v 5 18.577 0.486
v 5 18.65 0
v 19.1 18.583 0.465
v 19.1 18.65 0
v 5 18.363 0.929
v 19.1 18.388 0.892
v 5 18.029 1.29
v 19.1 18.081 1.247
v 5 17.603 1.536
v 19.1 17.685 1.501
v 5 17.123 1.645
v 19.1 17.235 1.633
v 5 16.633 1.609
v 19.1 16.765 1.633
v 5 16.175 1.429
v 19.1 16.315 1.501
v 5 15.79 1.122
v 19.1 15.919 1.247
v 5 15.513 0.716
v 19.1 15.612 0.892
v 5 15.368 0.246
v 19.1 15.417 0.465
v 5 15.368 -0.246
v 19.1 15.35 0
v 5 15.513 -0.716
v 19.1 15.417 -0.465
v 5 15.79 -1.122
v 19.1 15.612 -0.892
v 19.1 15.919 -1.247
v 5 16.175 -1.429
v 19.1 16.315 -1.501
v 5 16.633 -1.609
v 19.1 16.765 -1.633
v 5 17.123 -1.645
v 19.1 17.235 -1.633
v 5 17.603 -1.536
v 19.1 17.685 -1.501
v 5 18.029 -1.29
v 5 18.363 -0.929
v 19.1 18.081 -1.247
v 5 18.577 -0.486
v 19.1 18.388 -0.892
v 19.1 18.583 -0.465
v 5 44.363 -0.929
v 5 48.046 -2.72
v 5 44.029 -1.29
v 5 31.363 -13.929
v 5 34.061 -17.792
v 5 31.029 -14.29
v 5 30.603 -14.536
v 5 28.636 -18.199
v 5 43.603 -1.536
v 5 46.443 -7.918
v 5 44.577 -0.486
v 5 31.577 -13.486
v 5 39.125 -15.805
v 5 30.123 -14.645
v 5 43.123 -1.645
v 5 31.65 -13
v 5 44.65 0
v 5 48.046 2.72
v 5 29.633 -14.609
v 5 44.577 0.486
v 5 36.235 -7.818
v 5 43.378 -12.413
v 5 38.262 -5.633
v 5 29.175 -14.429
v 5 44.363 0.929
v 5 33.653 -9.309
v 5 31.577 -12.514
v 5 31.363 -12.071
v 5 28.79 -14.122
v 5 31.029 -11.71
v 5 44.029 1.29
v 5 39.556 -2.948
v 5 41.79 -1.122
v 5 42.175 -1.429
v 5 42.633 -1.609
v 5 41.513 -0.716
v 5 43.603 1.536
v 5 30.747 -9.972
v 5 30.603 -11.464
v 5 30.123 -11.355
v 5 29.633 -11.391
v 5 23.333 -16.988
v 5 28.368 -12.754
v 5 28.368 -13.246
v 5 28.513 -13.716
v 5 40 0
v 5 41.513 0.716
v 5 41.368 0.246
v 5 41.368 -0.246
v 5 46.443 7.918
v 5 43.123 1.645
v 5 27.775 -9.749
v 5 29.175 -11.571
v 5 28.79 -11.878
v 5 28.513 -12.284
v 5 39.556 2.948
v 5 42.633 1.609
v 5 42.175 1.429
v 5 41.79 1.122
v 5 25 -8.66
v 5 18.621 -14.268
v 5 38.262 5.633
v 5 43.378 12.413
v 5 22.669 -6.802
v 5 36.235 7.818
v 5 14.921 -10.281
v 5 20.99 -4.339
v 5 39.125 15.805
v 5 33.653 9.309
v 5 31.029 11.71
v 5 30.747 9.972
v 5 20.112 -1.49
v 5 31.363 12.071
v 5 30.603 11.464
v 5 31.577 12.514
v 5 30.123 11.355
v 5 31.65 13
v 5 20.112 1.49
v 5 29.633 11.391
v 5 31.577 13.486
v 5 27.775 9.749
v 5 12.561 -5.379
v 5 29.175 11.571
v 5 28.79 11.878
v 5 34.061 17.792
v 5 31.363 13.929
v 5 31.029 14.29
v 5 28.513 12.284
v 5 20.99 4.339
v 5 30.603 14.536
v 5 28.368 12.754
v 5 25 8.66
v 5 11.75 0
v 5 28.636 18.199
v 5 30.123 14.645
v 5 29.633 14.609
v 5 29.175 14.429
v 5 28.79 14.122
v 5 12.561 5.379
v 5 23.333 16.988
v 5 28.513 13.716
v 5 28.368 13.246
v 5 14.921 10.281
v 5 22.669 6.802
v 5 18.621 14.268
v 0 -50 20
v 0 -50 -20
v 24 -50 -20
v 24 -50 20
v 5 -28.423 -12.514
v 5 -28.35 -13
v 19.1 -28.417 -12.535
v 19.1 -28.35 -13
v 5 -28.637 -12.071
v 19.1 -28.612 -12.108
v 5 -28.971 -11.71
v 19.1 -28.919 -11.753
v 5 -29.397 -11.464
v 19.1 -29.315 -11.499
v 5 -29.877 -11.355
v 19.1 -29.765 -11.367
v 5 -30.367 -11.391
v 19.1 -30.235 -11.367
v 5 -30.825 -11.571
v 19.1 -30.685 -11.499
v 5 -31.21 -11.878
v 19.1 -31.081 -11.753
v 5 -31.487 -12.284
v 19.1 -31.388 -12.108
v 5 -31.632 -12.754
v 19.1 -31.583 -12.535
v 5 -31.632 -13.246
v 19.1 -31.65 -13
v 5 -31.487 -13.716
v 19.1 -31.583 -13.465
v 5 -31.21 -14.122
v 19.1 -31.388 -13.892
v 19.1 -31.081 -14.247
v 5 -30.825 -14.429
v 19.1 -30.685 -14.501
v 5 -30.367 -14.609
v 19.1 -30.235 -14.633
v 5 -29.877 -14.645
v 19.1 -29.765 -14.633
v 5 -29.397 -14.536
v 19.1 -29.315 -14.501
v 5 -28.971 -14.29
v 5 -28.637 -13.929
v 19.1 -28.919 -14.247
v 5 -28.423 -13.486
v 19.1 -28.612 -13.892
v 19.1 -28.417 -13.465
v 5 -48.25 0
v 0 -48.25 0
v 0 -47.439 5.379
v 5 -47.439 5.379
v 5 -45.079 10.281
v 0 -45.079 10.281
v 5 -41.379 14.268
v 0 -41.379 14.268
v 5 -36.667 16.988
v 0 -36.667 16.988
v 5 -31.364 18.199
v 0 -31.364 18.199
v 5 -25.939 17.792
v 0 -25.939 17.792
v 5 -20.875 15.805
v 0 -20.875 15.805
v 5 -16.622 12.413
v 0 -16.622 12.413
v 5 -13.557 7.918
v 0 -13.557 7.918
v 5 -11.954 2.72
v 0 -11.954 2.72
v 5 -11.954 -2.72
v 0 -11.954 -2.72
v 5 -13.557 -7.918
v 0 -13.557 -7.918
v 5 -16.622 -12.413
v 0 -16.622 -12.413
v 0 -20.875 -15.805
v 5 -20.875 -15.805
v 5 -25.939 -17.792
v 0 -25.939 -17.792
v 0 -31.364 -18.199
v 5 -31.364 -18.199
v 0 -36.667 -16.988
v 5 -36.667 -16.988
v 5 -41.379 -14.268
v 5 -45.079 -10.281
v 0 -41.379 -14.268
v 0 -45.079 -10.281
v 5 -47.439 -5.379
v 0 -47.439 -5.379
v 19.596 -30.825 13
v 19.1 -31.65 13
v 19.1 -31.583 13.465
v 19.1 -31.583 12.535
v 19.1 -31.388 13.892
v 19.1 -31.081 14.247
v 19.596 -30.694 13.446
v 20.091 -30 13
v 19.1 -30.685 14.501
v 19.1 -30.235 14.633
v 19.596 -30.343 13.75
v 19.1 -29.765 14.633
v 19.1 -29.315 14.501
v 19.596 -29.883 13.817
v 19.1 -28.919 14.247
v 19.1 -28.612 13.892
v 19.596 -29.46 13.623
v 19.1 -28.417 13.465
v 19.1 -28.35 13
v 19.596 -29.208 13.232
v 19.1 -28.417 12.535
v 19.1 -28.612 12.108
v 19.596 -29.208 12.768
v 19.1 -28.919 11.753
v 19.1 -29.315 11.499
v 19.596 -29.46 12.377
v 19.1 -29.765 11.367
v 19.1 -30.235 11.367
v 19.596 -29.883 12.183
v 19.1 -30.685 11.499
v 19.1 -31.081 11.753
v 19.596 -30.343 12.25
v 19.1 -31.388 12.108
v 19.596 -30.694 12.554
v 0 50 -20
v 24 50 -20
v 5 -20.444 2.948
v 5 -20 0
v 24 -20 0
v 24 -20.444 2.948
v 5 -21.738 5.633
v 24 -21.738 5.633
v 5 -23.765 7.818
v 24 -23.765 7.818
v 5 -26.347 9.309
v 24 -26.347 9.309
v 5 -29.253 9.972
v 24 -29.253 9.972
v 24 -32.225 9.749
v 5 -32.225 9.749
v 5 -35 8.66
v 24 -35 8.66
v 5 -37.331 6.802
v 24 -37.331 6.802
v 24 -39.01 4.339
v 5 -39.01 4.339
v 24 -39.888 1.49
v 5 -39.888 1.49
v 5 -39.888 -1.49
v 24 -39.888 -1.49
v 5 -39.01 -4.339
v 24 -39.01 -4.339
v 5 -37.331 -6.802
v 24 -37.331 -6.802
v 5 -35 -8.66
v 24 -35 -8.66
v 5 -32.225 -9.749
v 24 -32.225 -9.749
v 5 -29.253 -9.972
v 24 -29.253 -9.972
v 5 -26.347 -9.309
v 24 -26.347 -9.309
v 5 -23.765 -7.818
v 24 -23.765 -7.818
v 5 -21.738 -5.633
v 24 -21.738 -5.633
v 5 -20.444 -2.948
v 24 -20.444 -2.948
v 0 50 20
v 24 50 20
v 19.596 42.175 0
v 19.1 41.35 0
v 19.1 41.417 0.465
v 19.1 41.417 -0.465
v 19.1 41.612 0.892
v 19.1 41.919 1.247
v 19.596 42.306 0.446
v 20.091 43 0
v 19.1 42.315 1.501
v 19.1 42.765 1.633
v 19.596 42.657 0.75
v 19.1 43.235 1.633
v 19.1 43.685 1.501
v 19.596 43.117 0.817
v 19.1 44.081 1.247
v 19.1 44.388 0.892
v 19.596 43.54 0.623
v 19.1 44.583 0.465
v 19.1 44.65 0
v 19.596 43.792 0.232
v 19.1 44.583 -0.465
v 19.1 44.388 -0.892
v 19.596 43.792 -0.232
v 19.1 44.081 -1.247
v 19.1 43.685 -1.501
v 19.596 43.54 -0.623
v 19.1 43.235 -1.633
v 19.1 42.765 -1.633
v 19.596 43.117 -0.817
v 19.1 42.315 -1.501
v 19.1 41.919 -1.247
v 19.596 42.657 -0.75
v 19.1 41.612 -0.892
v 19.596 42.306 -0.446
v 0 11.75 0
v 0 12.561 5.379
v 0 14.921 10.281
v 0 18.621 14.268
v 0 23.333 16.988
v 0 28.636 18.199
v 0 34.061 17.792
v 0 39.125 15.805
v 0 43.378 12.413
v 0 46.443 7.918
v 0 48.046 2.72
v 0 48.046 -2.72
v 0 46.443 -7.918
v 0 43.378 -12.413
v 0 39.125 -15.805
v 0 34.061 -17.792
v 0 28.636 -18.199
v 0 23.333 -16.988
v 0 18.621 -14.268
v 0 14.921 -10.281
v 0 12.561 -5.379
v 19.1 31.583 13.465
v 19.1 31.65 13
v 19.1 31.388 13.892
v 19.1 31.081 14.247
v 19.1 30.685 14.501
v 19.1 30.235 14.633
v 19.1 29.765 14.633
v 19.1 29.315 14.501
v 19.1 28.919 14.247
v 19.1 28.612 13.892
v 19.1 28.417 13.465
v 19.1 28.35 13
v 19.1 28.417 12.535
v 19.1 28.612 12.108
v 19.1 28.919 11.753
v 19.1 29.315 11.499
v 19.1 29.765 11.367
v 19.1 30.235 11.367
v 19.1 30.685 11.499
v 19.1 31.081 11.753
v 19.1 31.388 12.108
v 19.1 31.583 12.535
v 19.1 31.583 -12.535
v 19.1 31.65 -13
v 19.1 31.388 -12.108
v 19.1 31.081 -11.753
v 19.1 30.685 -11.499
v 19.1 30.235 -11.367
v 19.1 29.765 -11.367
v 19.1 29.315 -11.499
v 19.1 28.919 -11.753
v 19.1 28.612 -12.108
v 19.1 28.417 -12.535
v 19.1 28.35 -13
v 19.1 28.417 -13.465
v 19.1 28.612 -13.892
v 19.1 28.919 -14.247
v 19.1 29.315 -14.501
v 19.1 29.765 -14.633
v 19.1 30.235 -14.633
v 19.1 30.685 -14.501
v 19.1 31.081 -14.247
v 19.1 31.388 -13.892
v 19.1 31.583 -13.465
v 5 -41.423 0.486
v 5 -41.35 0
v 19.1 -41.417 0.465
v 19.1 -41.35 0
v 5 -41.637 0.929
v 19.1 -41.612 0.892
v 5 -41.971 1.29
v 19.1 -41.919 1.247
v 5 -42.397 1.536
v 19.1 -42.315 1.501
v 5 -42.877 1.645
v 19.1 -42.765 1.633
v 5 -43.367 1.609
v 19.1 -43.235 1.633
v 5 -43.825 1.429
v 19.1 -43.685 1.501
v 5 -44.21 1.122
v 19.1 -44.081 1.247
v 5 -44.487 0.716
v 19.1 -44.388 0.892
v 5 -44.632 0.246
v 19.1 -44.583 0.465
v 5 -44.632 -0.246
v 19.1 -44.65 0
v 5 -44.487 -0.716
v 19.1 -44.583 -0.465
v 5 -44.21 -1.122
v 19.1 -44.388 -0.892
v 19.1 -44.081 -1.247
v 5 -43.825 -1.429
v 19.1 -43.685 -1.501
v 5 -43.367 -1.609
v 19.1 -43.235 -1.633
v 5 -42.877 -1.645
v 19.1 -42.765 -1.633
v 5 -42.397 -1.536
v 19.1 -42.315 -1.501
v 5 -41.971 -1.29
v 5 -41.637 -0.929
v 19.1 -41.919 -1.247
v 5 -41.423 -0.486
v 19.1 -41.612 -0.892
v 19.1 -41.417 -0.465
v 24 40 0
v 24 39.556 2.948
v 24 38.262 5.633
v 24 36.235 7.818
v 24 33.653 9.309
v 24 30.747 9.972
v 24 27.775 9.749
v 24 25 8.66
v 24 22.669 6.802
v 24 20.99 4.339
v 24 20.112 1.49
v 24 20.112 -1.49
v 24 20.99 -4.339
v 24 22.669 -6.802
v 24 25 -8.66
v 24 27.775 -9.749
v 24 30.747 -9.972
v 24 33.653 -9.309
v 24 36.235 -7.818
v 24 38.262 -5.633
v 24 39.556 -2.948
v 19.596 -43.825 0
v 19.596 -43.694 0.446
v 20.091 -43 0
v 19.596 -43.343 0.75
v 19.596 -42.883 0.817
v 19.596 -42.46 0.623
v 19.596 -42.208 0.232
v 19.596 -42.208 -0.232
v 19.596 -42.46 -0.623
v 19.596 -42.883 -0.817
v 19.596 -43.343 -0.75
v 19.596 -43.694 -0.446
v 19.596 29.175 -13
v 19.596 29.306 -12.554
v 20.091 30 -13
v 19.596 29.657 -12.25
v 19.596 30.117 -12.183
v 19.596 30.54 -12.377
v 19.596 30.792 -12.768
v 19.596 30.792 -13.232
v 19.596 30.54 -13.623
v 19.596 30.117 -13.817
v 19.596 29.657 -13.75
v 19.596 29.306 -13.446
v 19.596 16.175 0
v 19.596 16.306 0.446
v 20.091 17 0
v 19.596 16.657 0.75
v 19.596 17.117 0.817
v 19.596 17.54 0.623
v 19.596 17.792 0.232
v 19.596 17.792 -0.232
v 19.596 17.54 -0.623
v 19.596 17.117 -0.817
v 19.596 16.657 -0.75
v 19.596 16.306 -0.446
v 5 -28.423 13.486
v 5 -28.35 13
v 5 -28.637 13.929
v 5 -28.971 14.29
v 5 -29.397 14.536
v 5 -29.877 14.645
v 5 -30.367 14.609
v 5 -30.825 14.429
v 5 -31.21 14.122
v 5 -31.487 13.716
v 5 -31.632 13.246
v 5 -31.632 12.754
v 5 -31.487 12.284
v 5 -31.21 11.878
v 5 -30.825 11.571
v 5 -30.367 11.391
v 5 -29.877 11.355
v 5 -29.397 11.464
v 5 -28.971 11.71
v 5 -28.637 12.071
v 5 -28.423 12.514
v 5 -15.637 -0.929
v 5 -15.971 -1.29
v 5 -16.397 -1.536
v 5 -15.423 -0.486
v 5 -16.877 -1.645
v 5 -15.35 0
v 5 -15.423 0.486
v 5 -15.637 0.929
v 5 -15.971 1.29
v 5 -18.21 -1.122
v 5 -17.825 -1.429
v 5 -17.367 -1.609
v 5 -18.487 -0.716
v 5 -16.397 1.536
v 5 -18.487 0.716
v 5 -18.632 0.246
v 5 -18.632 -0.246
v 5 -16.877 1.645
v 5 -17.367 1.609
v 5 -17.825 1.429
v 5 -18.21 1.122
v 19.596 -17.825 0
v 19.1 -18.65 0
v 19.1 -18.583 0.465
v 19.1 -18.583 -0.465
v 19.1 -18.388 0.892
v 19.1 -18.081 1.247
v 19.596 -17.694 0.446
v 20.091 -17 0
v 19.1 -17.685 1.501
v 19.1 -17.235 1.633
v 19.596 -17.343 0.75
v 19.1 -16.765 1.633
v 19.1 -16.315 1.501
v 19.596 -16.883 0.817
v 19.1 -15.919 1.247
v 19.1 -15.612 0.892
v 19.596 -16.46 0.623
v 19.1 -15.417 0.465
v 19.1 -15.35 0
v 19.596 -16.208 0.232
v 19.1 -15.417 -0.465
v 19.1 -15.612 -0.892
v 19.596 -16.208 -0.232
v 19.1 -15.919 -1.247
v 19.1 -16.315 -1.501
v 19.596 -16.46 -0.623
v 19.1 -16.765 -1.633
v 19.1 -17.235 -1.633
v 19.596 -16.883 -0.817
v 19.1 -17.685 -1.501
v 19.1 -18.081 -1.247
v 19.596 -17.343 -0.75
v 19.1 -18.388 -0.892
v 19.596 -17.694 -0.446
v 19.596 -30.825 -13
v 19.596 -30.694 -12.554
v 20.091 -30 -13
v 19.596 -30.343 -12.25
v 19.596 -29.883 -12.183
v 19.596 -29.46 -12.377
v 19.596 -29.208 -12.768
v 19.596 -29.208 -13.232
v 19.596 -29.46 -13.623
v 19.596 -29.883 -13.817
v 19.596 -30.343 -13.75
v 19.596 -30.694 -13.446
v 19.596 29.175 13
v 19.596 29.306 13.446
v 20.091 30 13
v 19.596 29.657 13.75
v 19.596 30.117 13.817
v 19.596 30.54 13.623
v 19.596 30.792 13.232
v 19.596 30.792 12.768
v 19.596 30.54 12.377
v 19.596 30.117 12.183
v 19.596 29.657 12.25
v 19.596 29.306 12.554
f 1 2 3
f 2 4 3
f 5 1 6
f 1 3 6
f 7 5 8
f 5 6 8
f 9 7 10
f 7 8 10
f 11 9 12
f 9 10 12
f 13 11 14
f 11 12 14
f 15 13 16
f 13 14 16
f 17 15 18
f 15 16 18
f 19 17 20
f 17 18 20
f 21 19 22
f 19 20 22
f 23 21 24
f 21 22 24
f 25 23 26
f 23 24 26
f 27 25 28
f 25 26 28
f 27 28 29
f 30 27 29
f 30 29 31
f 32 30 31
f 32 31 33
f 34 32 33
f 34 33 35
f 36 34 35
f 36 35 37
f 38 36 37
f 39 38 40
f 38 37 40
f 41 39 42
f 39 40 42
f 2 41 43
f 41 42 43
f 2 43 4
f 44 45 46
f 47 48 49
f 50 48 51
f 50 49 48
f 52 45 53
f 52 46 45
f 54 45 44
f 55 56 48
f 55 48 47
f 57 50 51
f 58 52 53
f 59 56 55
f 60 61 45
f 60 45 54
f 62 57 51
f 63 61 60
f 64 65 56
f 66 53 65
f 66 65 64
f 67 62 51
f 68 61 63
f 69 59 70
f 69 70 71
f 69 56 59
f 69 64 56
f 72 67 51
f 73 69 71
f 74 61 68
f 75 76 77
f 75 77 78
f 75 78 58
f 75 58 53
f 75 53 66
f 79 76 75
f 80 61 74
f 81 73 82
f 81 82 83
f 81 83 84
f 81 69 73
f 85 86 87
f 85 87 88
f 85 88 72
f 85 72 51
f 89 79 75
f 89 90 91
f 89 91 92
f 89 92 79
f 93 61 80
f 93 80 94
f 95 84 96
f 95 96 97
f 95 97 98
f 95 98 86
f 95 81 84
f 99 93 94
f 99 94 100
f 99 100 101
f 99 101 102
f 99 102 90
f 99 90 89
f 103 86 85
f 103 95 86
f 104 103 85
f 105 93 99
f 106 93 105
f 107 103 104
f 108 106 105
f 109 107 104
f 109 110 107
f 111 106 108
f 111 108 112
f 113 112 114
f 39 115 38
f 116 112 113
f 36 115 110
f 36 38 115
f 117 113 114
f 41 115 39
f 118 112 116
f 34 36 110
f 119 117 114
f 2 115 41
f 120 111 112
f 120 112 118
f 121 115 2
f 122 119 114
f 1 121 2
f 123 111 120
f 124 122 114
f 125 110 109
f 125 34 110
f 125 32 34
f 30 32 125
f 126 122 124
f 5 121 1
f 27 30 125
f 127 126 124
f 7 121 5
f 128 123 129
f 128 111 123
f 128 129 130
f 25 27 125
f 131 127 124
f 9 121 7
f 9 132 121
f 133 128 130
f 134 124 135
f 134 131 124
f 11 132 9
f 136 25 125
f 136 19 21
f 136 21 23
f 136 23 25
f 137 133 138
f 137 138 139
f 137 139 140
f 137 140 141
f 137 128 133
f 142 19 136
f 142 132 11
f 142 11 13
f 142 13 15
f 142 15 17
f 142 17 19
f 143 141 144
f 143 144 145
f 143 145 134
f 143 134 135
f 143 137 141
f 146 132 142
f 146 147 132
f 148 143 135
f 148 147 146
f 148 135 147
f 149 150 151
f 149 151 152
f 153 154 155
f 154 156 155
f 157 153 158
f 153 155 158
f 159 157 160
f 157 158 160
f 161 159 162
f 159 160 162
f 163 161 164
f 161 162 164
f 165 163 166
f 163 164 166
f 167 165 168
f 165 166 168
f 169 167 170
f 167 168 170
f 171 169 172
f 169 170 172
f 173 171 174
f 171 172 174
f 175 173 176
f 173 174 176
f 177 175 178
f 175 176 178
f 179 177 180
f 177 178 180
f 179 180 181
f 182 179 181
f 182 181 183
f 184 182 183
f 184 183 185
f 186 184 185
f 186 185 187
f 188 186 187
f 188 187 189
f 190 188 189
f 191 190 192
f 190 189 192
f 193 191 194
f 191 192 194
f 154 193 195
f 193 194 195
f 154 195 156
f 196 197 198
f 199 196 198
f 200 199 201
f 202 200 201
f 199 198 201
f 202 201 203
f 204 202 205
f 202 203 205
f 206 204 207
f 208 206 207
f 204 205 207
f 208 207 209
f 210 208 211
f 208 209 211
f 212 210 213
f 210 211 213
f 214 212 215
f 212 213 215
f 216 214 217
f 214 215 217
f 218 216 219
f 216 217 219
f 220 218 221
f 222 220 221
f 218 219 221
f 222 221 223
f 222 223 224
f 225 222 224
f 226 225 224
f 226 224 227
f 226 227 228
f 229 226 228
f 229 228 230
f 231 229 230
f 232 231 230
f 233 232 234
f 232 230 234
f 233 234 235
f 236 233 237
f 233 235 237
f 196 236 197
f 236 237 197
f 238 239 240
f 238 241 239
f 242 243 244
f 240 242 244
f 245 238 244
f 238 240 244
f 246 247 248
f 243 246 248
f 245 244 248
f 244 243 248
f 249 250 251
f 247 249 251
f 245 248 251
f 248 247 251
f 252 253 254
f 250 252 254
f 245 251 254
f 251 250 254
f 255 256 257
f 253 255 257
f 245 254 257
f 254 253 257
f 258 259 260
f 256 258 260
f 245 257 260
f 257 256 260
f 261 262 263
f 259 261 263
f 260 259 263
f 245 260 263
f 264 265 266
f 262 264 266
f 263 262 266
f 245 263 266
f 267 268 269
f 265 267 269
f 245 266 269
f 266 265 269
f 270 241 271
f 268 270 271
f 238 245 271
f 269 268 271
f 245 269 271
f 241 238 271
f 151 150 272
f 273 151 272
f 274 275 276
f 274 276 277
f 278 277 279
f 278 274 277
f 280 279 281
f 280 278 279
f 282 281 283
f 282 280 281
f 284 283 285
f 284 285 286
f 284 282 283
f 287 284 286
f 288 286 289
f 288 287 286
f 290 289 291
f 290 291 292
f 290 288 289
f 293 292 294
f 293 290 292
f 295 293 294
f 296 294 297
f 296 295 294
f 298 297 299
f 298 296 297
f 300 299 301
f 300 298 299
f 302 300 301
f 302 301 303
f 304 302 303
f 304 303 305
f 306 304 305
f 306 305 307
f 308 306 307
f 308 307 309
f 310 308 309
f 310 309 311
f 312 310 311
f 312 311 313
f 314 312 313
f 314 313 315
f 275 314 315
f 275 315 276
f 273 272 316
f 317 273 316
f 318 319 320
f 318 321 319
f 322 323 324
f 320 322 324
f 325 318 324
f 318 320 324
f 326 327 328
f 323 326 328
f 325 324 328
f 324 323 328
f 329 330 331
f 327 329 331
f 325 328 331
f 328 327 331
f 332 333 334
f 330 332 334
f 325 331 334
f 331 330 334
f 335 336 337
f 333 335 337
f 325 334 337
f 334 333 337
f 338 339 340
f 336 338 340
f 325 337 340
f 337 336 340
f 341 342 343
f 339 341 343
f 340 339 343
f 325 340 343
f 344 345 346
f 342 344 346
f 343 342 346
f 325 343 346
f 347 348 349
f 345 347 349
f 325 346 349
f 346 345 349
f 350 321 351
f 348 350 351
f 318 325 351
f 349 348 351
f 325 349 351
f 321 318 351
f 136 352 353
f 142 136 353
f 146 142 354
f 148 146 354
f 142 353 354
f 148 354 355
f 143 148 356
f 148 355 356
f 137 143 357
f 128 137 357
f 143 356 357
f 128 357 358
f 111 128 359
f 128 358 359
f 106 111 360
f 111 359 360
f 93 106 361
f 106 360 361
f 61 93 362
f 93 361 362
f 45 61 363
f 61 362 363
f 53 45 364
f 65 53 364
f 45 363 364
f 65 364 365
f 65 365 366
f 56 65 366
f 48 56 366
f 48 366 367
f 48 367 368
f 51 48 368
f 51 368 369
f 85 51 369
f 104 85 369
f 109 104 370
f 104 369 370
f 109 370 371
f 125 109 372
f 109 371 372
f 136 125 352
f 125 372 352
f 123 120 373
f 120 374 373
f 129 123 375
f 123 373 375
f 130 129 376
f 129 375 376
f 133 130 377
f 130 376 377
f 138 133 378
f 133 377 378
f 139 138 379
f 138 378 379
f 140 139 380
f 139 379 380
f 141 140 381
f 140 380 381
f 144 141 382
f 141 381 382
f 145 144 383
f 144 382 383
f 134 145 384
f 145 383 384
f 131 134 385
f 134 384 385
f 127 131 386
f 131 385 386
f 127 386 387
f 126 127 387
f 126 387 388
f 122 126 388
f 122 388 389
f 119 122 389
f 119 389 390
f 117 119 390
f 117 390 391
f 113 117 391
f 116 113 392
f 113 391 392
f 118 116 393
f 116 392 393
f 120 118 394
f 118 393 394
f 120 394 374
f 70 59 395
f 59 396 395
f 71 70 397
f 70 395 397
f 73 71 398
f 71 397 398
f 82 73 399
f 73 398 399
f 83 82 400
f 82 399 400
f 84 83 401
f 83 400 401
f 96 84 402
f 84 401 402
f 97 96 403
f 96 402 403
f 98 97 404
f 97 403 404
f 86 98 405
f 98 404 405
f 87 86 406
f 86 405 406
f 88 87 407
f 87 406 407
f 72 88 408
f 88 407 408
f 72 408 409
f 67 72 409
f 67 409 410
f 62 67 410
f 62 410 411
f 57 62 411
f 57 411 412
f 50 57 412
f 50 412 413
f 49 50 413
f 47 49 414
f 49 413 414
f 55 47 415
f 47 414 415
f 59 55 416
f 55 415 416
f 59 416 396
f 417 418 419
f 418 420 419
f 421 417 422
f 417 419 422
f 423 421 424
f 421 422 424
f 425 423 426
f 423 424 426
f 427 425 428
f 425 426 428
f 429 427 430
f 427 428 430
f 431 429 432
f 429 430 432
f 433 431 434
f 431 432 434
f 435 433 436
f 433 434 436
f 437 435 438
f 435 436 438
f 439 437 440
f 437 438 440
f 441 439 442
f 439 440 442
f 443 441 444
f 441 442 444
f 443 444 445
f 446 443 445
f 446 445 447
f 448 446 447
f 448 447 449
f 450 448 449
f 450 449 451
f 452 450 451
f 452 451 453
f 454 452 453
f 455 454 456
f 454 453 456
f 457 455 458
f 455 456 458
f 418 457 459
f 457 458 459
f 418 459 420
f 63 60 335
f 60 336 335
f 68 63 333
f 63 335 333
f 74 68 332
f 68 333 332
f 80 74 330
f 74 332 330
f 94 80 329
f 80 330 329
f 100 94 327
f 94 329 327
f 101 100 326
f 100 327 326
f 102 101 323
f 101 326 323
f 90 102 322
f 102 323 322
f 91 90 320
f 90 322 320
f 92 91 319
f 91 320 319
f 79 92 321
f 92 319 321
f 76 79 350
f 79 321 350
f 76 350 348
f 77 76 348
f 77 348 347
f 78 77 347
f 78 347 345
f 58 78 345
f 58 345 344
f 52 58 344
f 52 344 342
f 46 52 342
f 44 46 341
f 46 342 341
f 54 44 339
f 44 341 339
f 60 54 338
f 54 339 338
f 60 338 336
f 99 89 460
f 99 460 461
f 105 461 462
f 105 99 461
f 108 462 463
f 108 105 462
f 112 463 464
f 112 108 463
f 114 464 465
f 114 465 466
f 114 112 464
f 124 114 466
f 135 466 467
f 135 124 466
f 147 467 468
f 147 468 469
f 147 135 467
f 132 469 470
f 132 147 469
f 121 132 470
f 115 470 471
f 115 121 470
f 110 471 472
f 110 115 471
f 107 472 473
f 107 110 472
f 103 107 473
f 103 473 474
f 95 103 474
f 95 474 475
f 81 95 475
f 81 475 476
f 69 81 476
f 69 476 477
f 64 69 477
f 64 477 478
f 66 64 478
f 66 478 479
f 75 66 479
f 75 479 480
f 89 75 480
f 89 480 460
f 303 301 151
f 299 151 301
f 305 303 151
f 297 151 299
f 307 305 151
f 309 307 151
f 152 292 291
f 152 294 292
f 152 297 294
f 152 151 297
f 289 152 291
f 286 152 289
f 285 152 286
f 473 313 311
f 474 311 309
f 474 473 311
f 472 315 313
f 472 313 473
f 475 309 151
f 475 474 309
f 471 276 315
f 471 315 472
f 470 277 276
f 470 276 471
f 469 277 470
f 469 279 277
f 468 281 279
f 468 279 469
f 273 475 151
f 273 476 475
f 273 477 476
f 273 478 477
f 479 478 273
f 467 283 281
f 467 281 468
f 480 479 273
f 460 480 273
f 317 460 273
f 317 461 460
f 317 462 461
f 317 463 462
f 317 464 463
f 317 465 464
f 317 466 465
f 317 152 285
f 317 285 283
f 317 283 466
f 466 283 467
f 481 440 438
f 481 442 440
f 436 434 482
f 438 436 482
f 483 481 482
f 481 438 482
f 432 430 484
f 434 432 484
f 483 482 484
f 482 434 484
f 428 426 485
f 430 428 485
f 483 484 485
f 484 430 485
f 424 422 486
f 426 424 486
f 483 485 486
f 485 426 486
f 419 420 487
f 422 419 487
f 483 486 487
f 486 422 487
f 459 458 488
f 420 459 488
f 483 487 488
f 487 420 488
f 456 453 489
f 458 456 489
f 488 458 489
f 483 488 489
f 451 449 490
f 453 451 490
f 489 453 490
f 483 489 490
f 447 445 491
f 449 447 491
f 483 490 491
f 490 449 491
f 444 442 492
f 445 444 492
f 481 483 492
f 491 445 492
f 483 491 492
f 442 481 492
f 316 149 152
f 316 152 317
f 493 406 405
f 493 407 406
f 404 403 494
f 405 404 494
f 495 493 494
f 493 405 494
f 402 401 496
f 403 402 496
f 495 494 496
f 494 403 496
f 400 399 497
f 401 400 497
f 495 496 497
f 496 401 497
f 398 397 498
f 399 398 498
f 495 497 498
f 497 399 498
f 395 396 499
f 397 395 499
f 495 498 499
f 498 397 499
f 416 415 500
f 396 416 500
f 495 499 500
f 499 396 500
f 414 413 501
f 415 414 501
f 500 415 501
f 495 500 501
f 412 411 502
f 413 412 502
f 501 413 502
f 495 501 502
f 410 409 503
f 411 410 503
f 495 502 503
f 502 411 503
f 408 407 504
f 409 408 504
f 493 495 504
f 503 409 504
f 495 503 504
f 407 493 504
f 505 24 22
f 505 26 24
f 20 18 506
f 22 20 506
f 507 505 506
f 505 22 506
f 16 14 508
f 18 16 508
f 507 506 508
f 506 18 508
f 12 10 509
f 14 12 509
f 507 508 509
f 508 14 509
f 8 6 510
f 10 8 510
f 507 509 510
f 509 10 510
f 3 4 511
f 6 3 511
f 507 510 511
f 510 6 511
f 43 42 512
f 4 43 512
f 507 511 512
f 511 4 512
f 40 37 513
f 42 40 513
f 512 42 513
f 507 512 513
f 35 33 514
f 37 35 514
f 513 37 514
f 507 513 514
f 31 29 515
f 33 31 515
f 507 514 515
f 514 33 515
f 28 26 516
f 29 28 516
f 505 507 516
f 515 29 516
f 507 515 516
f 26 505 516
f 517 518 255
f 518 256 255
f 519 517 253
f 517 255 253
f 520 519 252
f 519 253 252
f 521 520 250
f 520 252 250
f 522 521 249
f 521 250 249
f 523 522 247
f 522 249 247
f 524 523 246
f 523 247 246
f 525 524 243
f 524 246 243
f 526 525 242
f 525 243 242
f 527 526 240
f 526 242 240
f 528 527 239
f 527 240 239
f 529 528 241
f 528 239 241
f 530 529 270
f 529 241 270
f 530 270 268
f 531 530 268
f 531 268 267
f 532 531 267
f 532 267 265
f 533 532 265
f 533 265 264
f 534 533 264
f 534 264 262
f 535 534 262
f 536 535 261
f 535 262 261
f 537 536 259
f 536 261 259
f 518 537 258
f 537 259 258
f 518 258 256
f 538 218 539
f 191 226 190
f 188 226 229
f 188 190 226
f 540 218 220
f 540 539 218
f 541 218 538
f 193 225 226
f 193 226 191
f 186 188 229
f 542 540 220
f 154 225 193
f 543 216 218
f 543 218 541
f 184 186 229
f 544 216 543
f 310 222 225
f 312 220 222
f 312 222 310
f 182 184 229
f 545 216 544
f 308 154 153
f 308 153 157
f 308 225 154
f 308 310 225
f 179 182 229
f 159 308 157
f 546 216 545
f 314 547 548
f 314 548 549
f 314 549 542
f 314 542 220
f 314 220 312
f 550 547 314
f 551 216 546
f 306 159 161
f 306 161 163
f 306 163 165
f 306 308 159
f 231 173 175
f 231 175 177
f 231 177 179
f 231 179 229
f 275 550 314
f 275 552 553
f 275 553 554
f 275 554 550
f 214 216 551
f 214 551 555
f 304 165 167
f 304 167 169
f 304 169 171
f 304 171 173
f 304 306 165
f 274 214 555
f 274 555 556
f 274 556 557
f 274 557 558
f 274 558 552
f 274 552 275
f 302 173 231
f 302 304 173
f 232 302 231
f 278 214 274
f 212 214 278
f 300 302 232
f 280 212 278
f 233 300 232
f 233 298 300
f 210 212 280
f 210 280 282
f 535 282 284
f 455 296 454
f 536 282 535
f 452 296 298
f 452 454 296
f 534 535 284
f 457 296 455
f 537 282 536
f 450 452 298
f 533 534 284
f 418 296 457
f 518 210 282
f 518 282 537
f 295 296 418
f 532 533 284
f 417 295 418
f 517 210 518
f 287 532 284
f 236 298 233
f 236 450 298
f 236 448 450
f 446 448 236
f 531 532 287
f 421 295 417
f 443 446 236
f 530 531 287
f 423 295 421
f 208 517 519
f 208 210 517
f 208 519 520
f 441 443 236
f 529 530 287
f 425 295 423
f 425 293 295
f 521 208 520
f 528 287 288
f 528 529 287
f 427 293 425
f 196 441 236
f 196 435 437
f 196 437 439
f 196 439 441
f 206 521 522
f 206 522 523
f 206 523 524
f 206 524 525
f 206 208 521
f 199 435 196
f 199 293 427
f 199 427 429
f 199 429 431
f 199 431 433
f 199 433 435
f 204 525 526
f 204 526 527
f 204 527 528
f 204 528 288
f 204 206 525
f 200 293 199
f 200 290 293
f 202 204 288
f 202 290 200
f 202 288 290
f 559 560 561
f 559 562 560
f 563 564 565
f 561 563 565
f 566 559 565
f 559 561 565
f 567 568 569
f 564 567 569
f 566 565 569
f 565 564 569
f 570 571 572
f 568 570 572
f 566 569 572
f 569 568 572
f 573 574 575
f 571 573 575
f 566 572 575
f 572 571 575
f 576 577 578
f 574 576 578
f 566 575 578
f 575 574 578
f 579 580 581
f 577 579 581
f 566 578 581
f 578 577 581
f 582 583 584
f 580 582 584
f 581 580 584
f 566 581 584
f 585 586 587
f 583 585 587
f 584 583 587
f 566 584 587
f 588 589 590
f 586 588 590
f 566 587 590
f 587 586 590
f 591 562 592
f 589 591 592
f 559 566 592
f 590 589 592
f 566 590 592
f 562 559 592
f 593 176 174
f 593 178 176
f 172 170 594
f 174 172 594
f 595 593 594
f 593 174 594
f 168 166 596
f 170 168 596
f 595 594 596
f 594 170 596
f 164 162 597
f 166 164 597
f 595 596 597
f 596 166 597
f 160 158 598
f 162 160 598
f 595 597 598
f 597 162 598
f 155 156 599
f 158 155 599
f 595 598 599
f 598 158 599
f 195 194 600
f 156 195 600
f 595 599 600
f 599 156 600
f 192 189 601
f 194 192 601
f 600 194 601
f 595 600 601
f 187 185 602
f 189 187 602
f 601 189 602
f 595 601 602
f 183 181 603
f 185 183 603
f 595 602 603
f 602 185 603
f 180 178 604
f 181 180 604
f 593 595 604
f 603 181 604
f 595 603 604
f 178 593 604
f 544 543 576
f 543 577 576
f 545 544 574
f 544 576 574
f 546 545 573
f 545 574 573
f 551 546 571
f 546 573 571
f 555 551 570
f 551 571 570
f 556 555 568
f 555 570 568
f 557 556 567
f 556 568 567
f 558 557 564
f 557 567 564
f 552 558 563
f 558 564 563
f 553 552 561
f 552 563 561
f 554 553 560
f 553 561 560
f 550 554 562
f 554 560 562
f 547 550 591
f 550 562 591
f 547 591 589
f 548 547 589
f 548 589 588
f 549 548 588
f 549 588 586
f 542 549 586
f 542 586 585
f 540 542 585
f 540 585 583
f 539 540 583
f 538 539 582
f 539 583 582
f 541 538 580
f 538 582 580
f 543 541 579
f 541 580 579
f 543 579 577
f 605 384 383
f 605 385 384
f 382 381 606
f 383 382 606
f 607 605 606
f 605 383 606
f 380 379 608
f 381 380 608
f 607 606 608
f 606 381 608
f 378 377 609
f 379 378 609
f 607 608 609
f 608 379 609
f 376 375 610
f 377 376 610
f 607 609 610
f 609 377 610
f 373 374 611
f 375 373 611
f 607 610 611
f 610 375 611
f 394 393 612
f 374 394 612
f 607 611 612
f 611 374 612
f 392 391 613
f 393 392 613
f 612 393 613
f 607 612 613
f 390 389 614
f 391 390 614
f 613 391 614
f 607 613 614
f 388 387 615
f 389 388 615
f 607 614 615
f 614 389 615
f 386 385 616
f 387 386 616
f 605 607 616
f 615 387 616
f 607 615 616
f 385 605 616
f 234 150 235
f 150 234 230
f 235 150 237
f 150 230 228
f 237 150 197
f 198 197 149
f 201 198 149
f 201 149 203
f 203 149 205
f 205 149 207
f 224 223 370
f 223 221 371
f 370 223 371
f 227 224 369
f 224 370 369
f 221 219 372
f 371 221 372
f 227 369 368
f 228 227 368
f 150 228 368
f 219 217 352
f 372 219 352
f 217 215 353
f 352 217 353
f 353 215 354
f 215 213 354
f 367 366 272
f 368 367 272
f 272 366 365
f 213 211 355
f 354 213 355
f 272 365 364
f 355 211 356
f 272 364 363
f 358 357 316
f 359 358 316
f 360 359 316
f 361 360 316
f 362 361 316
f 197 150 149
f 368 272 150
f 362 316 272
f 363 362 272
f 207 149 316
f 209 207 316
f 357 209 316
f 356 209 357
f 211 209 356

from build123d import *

# Parameters (mm, degrees)
F0_W     = 100
F0_H     = 40
F0_R     = 10
F1_DEPTH = 24
F2_R     = 18.25
F2_R_2   = 10
F3_DEPTH = 5
F5_D     = 3.3
F5_DEPTH = 14.1
F5_TIP   = 0.9914200214


with BuildPart() as f1:
    # F0 (on Right) → F1 (new body)
    with BuildSketch(Plane.YZ):
        Rectangle(F0_W, F0_H)
        with Locations((-30, 0)):
            Circle(F0_R, mode=Mode.SUBTRACT)
        with Locations((30, 0)):
            Circle(F0_R, mode=Mode.SUBTRACT)
    extrude(amount=F1_DEPTH)

    # F2 (on face) → F3 (cut)
    with BuildSketch(Plane(origin=(0, 0, 0), x_dir=(0, -1, 0), z_dir=(-1, 0, 0))):
        with Locations((-30, 0)):
            Circle(F2_R)
        with Locations((-30, 0)):
            Circle(F2_R_2, mode=Mode.SUBTRACT)
        with Locations((30, 0)):
            Circle(F2_R)
        with Locations((30, 0)):
            Circle(F2_R_2, mode=Mode.SUBTRACT)
    extrude(amount=-F3_DEPTH, mode=Mode.SUBTRACT)

    # F5
    with Locations(Plane(origin=(5, 0, 0), x_dir=(0, -1, 0), z_dir=(-1, 0, 0))):
        with Locations((-43, 0), (-30, 13), (-17, 0), (-30, -13), (17, 0), (30, 13), (43, 0), (30, -13)):
            Hole(F5_D / 2, depth=F5_DEPTH)
            with Locations((0, 0, -(F5_DEPTH + F5_TIP / 2))):  # 118° drill point
                Cone(0, F5_D / 2, F5_TIP, mode=Mode.SUBTRACT)


solid = f1.part
